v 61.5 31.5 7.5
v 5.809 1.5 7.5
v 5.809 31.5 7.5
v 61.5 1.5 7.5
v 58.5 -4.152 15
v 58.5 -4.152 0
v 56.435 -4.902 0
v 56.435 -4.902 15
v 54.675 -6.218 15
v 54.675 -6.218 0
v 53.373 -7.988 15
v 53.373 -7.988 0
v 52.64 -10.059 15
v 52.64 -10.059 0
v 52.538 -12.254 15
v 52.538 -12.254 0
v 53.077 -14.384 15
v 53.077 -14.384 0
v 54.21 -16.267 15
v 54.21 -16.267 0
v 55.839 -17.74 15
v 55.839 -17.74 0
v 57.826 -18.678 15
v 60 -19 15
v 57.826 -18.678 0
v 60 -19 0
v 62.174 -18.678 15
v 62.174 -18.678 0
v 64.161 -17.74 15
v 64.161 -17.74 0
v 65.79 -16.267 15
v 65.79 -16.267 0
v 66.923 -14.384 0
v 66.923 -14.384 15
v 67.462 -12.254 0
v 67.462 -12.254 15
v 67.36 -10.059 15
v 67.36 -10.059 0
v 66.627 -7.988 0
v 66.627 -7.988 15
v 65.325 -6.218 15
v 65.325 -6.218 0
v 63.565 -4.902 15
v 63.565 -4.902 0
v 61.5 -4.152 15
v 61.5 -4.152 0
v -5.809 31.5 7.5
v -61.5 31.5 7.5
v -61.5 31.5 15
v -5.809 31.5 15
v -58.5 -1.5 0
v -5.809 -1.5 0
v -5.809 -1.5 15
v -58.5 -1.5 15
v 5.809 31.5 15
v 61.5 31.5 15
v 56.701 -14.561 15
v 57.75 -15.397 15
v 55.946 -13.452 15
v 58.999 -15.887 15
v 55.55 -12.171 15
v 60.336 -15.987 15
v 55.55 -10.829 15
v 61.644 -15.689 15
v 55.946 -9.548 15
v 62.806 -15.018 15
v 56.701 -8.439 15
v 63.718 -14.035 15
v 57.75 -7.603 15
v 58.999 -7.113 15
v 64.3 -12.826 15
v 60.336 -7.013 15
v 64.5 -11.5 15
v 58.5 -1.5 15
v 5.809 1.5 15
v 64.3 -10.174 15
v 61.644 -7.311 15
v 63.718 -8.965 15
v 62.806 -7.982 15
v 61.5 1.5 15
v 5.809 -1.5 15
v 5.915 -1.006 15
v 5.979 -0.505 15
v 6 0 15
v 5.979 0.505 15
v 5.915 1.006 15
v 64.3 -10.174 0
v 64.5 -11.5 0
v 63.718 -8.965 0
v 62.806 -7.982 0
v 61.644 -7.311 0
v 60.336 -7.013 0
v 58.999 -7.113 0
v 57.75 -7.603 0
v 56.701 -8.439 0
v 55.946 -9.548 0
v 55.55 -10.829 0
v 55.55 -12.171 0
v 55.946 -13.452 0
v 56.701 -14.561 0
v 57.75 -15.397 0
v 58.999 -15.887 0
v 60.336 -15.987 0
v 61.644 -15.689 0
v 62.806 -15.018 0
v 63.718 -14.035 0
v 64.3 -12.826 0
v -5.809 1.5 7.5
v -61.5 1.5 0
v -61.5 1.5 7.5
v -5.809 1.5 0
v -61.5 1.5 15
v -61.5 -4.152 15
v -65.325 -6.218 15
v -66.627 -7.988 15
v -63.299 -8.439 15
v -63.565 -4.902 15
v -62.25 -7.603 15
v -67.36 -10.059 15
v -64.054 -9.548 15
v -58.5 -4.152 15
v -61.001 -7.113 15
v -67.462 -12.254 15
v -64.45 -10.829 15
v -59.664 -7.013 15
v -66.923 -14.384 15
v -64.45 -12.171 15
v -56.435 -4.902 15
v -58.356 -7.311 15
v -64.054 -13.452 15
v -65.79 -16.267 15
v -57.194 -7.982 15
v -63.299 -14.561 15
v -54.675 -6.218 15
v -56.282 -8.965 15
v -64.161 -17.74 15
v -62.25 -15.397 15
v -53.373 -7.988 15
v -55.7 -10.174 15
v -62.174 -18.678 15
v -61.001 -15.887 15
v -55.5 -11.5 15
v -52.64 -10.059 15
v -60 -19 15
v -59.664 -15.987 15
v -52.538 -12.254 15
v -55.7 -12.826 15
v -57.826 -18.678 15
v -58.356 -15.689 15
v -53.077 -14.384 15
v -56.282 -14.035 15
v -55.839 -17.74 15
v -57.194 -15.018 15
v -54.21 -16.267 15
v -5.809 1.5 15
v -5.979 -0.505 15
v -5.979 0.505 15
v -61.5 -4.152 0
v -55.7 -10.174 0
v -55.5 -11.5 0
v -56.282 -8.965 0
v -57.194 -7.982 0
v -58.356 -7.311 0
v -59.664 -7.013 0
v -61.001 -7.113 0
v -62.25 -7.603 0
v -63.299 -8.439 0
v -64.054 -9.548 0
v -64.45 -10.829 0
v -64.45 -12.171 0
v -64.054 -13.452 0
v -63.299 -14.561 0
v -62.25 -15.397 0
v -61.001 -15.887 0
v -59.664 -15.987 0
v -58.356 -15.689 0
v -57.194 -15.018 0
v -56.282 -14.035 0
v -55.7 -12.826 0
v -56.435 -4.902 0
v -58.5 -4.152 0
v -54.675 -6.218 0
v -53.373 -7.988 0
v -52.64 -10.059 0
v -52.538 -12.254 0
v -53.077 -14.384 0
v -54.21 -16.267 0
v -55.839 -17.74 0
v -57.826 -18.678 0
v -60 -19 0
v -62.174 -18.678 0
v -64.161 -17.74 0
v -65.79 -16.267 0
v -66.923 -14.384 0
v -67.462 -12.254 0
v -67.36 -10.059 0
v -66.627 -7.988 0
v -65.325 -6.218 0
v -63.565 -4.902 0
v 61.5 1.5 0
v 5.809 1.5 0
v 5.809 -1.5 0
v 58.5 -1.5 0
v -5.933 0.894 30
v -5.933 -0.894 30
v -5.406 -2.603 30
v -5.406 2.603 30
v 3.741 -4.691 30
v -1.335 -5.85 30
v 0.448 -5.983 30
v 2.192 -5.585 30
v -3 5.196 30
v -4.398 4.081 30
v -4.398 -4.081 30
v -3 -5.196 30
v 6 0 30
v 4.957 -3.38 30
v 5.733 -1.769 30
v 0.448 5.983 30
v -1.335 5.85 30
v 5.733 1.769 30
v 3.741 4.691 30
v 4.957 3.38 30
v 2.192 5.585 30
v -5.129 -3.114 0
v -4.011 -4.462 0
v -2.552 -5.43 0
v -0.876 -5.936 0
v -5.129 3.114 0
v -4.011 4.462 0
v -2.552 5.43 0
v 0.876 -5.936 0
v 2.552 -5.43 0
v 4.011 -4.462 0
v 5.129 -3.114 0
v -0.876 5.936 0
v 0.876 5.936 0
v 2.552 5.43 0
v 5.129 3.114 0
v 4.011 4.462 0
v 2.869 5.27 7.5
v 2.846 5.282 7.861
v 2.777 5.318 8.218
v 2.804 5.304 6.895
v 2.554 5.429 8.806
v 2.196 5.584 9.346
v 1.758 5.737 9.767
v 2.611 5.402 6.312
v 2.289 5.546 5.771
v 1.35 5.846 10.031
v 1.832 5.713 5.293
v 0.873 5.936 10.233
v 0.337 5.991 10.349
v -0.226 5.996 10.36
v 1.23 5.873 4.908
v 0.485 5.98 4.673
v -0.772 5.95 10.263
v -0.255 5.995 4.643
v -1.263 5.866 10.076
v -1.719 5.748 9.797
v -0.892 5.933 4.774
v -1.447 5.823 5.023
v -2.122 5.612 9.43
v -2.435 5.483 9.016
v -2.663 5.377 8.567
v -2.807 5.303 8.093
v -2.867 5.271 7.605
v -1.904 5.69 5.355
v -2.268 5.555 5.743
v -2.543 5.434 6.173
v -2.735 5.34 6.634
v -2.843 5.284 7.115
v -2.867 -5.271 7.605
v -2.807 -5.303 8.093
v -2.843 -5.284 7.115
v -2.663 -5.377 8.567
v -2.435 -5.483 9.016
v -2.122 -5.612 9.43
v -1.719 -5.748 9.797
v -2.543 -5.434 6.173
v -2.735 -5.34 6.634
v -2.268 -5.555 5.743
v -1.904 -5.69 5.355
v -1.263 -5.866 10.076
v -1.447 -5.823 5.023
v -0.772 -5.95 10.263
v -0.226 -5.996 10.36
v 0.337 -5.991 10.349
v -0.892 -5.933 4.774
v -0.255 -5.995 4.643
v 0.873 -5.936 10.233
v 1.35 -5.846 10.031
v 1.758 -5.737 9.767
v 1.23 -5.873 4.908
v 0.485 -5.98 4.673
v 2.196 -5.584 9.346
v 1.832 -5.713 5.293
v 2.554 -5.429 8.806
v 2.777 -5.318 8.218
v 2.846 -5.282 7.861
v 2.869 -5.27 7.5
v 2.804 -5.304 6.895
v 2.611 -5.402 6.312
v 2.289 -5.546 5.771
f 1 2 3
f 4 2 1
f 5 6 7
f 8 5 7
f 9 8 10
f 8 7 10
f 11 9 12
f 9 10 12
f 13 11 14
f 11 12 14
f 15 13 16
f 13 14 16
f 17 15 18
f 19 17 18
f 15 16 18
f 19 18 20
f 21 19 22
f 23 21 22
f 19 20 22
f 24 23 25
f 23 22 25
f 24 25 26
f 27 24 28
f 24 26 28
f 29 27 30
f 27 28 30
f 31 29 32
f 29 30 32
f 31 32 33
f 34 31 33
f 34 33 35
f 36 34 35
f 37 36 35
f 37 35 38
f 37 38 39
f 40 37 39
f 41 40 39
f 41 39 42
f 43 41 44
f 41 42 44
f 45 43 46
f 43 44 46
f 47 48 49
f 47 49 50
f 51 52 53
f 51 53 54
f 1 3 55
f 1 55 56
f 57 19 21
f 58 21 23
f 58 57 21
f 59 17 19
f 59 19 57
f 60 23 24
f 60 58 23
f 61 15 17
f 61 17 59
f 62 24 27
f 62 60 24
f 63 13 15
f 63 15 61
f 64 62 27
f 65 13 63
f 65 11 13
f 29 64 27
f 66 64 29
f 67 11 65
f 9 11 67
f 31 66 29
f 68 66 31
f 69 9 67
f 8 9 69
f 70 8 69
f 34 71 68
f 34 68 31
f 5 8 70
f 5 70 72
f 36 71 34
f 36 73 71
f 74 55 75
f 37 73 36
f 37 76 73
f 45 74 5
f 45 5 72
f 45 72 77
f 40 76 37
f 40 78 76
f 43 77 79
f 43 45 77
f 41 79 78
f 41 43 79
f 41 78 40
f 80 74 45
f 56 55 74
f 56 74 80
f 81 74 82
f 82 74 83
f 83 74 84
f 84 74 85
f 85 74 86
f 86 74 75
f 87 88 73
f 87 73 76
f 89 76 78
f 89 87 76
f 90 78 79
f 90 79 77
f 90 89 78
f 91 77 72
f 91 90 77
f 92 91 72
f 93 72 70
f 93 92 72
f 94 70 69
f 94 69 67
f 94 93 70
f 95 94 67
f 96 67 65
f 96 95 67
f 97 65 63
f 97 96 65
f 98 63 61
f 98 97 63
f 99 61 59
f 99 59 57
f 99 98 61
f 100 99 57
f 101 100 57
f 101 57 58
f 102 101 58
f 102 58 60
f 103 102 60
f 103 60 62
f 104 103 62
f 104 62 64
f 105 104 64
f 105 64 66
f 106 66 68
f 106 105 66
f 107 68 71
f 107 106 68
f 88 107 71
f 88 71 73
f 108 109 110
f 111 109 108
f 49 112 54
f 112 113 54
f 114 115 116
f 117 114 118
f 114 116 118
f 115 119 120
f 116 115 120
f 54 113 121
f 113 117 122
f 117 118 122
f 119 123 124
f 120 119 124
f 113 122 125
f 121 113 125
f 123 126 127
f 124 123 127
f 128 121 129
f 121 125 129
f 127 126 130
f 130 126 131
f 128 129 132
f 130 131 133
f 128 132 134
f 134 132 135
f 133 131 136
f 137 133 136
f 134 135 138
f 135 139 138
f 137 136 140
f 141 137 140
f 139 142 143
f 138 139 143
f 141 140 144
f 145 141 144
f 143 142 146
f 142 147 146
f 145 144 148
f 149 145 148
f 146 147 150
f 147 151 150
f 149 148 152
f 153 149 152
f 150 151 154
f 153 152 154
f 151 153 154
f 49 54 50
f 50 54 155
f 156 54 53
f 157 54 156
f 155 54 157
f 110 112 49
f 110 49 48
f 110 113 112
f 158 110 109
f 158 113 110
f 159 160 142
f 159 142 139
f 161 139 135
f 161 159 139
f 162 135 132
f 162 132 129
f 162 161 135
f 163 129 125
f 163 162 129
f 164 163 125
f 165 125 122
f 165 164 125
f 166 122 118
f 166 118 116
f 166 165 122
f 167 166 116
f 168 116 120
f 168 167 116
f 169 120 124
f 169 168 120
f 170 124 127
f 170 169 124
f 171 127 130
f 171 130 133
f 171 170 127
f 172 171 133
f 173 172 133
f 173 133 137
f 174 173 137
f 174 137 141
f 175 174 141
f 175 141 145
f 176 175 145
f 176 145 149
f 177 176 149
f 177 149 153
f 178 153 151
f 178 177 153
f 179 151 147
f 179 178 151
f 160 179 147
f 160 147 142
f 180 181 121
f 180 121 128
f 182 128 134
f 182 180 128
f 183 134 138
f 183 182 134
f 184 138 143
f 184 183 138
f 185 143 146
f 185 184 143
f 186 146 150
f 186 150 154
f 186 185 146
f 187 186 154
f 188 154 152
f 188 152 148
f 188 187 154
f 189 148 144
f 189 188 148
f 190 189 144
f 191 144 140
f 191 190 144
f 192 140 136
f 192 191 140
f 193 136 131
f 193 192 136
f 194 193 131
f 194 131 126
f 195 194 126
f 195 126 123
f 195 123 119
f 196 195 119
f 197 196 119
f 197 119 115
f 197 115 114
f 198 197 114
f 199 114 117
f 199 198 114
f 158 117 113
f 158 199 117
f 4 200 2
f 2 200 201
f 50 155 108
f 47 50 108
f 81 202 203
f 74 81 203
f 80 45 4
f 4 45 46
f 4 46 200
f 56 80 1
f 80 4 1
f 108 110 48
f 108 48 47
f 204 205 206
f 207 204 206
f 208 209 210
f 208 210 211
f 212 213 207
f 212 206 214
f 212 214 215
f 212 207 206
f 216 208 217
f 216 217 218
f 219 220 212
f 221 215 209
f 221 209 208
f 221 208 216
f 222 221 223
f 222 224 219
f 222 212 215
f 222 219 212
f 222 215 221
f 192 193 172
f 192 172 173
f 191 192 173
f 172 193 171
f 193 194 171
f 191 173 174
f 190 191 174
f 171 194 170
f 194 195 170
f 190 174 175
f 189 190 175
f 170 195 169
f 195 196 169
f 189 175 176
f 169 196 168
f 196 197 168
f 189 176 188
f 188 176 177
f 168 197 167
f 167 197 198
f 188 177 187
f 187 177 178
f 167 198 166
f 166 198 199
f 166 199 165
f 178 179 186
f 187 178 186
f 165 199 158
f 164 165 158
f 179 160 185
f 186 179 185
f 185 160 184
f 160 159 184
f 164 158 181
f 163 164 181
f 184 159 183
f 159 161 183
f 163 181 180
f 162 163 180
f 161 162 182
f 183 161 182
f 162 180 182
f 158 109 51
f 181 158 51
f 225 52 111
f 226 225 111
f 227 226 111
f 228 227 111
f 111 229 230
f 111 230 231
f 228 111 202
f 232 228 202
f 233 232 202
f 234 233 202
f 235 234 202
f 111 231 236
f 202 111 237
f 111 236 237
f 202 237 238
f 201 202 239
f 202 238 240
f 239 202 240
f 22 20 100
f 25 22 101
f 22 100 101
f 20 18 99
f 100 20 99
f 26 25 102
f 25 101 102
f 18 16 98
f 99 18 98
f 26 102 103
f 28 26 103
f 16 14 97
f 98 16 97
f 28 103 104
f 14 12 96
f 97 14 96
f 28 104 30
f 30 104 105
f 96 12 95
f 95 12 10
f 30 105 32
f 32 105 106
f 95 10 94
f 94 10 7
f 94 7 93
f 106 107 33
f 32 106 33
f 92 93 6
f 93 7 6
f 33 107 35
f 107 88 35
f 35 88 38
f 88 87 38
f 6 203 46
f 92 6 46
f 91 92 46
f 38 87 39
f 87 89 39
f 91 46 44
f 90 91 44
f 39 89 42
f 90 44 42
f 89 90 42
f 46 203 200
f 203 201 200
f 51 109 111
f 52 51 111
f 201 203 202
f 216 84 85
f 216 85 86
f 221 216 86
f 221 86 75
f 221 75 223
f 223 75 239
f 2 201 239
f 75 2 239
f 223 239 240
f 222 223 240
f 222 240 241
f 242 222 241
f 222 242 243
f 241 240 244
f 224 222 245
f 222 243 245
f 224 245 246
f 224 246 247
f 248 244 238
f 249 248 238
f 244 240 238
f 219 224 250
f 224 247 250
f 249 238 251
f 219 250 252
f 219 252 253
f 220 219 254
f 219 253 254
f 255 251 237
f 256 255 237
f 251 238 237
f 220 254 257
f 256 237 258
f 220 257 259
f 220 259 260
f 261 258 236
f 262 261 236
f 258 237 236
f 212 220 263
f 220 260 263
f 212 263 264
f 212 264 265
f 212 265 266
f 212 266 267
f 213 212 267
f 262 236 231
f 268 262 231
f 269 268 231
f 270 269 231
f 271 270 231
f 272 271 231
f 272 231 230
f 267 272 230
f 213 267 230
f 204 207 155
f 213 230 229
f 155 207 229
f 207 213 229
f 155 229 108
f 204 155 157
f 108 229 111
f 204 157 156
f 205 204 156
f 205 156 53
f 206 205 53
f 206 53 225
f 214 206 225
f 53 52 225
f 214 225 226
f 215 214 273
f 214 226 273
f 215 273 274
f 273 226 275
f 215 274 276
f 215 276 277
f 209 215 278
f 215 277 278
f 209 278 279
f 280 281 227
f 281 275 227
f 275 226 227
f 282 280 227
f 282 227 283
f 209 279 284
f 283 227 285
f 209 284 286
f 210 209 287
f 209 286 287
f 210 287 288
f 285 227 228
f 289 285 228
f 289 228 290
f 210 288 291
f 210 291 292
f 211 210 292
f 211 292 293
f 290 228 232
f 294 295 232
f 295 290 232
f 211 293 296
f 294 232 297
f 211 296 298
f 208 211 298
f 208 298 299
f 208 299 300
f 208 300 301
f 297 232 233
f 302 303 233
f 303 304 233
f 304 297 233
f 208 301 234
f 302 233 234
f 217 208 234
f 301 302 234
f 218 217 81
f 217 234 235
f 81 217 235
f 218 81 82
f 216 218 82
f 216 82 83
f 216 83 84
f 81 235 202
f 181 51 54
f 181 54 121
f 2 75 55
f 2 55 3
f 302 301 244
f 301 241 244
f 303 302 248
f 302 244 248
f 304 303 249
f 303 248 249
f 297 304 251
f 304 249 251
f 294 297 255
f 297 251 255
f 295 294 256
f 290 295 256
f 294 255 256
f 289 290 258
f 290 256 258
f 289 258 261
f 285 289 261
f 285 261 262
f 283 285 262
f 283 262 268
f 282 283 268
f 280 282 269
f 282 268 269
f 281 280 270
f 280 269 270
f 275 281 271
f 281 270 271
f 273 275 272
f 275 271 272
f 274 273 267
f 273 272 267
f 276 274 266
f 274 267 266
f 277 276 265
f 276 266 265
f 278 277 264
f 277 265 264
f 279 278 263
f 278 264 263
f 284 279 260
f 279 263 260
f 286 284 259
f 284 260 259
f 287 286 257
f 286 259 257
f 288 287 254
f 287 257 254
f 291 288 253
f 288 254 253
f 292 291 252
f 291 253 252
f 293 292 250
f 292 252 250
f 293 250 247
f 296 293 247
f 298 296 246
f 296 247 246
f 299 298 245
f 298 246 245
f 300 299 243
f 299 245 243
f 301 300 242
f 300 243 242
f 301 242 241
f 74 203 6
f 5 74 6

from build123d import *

# Parameters (mm, degrees)
SKETCH1_R                      = 6
BOSS_EXTRUDE1_DEPTH            = 30
SKETCH2_R                      = 4.5
BOSS_EXTRUDE2_DEPTH            = 15
CUT_EXTRUDE1_REACH             = 21
SKETCH3_R                      = 2.868632687
CUT_EXTRUDE1_DIRECTION_2_REACH = 8
SKETCH4_W                      = 55.690524981
SKETCH4_H                      = 7.5
BOSS_EXTRUDE3_DEPTH            = 30


with BuildPart() as part:
    # Sketch1 → Boss-Extrude1 (new body)
    with BuildSketch(Plane.XY):
        Circle(SKETCH1_R)
    extrude(amount=BOSS_EXTRUDE1_DEPTH)

    # Sketch2 → Boss-Extrude2 (add)
    with BuildSketch(Plane.XY):
        with BuildLine():
            Line((6, -1.5), (58.5, -1.5))
            Line((58.5, -1.5), (58.5, -4.151530772))
            ThreePointArc((58.5, -4.151530772), (60, -19), (61.5, -4.151530772))
            Line((61.5, -4.151530772), (61.5, 1.5))
            Line((61.5, 1.5), (6, 1.5))
            Line((6, 1.5), (5.809475019, 1.5))
            ThreePointArc((5.809475019, 1.5), (6, 0), (5.809475019, -1.5))
            Line((5.809475019, -1.5), (6, -1.5))
        make_face()
        with Locations((60, -11.5)):
            Circle(SKETCH2_R, mode=Mode.SUBTRACT)
        with BuildLine():
            Line((-58.5, -1.5), (-58.5, -4.151530772))
            ThreePointArc((-58.5, -4.151530772), (-60, -19), (-61.5, -4.151530772))
            Line((-61.5, -4.151530772), (-61.5, 1.5))
            Line((-61.5, 1.5), (-6, 1.5))
            Line((-6, 1.5), (-5.809475019, 1.5))
            ThreePointArc((-5.809475019, 1.5), (-6, 0), (-5.809475019, -1.5))
            Line((-5.809475019, -1.5), (-6, -1.5))
            Line((-6, -1.5), (-58.5, -1.5))
        make_face()
        with Locations((-60, -11.5)):
            Circle(SKETCH2_R, mode=Mode.SUBTRACT)
    extrude(amount=BOSS_EXTRUDE2_DEPTH)

    # Sketch3 → Cut-Extrude1 (cut, up to next)
    with BuildSketch(Plane(origin=(0, 0, 0), x_dir=(1, 0, 0), z_dir=(0, 1, 0)), mode=Mode.PRIVATE) as cut_extrude1_sk1:
        with Locations((0, -7.5)):
            Circle(SKETCH3_R)
    cut_extrude1_tool1 = extrude(cut_extrude1_sk1.sketch, amount=-CUT_EXTRUDE1_REACH, mode=Mode.PRIVATE) & part.part
    add(cut_extrude1_tool1.solids().sort_by_distance((0, 0, 7.5))[0], mode=Mode.SUBTRACT)

    # Sketch3 → Cut-Extrude1 direction 2 (cut, up to next)
    with BuildSketch(Plane(origin=(0, 0, 0), x_dir=(1, 0, 0), z_dir=(0, 1, 0)), mode=Mode.PRIVATE) as cut_extrude1_direction_2_sk1:
        with Locations((0, -7.5)):
            Circle(SKETCH3_R)
    cut_extrude1_direction_2_tool1 = extrude(cut_extrude1_direction_2_sk1.sketch, amount=CUT_EXTRUDE1_DIRECTION_2_REACH, mode=Mode.PRIVATE) & part.part
    add(cut_extrude1_direction_2_tool1.solids().sort_by_distance((0, 0, 7.5))[0], mode=Mode.SUBTRACT)

    # Sketch4 → Boss-Extrude3 (add)
    with BuildSketch(Plane(origin=(0, 1.5, 0), x_dir=(1, 0, 0), z_dir=(0, 1, 0))):
        with Locations((-33.65473751, -11.25)):
            Rectangle(SKETCH4_W, SKETCH4_H)
        with Locations((33.65473751, -11.25)):
            Rectangle(SKETCH4_W, SKETCH4_H)
    extrude(amount=BOSS_EXTRUDE3_DEPTH)


solid = part.part
